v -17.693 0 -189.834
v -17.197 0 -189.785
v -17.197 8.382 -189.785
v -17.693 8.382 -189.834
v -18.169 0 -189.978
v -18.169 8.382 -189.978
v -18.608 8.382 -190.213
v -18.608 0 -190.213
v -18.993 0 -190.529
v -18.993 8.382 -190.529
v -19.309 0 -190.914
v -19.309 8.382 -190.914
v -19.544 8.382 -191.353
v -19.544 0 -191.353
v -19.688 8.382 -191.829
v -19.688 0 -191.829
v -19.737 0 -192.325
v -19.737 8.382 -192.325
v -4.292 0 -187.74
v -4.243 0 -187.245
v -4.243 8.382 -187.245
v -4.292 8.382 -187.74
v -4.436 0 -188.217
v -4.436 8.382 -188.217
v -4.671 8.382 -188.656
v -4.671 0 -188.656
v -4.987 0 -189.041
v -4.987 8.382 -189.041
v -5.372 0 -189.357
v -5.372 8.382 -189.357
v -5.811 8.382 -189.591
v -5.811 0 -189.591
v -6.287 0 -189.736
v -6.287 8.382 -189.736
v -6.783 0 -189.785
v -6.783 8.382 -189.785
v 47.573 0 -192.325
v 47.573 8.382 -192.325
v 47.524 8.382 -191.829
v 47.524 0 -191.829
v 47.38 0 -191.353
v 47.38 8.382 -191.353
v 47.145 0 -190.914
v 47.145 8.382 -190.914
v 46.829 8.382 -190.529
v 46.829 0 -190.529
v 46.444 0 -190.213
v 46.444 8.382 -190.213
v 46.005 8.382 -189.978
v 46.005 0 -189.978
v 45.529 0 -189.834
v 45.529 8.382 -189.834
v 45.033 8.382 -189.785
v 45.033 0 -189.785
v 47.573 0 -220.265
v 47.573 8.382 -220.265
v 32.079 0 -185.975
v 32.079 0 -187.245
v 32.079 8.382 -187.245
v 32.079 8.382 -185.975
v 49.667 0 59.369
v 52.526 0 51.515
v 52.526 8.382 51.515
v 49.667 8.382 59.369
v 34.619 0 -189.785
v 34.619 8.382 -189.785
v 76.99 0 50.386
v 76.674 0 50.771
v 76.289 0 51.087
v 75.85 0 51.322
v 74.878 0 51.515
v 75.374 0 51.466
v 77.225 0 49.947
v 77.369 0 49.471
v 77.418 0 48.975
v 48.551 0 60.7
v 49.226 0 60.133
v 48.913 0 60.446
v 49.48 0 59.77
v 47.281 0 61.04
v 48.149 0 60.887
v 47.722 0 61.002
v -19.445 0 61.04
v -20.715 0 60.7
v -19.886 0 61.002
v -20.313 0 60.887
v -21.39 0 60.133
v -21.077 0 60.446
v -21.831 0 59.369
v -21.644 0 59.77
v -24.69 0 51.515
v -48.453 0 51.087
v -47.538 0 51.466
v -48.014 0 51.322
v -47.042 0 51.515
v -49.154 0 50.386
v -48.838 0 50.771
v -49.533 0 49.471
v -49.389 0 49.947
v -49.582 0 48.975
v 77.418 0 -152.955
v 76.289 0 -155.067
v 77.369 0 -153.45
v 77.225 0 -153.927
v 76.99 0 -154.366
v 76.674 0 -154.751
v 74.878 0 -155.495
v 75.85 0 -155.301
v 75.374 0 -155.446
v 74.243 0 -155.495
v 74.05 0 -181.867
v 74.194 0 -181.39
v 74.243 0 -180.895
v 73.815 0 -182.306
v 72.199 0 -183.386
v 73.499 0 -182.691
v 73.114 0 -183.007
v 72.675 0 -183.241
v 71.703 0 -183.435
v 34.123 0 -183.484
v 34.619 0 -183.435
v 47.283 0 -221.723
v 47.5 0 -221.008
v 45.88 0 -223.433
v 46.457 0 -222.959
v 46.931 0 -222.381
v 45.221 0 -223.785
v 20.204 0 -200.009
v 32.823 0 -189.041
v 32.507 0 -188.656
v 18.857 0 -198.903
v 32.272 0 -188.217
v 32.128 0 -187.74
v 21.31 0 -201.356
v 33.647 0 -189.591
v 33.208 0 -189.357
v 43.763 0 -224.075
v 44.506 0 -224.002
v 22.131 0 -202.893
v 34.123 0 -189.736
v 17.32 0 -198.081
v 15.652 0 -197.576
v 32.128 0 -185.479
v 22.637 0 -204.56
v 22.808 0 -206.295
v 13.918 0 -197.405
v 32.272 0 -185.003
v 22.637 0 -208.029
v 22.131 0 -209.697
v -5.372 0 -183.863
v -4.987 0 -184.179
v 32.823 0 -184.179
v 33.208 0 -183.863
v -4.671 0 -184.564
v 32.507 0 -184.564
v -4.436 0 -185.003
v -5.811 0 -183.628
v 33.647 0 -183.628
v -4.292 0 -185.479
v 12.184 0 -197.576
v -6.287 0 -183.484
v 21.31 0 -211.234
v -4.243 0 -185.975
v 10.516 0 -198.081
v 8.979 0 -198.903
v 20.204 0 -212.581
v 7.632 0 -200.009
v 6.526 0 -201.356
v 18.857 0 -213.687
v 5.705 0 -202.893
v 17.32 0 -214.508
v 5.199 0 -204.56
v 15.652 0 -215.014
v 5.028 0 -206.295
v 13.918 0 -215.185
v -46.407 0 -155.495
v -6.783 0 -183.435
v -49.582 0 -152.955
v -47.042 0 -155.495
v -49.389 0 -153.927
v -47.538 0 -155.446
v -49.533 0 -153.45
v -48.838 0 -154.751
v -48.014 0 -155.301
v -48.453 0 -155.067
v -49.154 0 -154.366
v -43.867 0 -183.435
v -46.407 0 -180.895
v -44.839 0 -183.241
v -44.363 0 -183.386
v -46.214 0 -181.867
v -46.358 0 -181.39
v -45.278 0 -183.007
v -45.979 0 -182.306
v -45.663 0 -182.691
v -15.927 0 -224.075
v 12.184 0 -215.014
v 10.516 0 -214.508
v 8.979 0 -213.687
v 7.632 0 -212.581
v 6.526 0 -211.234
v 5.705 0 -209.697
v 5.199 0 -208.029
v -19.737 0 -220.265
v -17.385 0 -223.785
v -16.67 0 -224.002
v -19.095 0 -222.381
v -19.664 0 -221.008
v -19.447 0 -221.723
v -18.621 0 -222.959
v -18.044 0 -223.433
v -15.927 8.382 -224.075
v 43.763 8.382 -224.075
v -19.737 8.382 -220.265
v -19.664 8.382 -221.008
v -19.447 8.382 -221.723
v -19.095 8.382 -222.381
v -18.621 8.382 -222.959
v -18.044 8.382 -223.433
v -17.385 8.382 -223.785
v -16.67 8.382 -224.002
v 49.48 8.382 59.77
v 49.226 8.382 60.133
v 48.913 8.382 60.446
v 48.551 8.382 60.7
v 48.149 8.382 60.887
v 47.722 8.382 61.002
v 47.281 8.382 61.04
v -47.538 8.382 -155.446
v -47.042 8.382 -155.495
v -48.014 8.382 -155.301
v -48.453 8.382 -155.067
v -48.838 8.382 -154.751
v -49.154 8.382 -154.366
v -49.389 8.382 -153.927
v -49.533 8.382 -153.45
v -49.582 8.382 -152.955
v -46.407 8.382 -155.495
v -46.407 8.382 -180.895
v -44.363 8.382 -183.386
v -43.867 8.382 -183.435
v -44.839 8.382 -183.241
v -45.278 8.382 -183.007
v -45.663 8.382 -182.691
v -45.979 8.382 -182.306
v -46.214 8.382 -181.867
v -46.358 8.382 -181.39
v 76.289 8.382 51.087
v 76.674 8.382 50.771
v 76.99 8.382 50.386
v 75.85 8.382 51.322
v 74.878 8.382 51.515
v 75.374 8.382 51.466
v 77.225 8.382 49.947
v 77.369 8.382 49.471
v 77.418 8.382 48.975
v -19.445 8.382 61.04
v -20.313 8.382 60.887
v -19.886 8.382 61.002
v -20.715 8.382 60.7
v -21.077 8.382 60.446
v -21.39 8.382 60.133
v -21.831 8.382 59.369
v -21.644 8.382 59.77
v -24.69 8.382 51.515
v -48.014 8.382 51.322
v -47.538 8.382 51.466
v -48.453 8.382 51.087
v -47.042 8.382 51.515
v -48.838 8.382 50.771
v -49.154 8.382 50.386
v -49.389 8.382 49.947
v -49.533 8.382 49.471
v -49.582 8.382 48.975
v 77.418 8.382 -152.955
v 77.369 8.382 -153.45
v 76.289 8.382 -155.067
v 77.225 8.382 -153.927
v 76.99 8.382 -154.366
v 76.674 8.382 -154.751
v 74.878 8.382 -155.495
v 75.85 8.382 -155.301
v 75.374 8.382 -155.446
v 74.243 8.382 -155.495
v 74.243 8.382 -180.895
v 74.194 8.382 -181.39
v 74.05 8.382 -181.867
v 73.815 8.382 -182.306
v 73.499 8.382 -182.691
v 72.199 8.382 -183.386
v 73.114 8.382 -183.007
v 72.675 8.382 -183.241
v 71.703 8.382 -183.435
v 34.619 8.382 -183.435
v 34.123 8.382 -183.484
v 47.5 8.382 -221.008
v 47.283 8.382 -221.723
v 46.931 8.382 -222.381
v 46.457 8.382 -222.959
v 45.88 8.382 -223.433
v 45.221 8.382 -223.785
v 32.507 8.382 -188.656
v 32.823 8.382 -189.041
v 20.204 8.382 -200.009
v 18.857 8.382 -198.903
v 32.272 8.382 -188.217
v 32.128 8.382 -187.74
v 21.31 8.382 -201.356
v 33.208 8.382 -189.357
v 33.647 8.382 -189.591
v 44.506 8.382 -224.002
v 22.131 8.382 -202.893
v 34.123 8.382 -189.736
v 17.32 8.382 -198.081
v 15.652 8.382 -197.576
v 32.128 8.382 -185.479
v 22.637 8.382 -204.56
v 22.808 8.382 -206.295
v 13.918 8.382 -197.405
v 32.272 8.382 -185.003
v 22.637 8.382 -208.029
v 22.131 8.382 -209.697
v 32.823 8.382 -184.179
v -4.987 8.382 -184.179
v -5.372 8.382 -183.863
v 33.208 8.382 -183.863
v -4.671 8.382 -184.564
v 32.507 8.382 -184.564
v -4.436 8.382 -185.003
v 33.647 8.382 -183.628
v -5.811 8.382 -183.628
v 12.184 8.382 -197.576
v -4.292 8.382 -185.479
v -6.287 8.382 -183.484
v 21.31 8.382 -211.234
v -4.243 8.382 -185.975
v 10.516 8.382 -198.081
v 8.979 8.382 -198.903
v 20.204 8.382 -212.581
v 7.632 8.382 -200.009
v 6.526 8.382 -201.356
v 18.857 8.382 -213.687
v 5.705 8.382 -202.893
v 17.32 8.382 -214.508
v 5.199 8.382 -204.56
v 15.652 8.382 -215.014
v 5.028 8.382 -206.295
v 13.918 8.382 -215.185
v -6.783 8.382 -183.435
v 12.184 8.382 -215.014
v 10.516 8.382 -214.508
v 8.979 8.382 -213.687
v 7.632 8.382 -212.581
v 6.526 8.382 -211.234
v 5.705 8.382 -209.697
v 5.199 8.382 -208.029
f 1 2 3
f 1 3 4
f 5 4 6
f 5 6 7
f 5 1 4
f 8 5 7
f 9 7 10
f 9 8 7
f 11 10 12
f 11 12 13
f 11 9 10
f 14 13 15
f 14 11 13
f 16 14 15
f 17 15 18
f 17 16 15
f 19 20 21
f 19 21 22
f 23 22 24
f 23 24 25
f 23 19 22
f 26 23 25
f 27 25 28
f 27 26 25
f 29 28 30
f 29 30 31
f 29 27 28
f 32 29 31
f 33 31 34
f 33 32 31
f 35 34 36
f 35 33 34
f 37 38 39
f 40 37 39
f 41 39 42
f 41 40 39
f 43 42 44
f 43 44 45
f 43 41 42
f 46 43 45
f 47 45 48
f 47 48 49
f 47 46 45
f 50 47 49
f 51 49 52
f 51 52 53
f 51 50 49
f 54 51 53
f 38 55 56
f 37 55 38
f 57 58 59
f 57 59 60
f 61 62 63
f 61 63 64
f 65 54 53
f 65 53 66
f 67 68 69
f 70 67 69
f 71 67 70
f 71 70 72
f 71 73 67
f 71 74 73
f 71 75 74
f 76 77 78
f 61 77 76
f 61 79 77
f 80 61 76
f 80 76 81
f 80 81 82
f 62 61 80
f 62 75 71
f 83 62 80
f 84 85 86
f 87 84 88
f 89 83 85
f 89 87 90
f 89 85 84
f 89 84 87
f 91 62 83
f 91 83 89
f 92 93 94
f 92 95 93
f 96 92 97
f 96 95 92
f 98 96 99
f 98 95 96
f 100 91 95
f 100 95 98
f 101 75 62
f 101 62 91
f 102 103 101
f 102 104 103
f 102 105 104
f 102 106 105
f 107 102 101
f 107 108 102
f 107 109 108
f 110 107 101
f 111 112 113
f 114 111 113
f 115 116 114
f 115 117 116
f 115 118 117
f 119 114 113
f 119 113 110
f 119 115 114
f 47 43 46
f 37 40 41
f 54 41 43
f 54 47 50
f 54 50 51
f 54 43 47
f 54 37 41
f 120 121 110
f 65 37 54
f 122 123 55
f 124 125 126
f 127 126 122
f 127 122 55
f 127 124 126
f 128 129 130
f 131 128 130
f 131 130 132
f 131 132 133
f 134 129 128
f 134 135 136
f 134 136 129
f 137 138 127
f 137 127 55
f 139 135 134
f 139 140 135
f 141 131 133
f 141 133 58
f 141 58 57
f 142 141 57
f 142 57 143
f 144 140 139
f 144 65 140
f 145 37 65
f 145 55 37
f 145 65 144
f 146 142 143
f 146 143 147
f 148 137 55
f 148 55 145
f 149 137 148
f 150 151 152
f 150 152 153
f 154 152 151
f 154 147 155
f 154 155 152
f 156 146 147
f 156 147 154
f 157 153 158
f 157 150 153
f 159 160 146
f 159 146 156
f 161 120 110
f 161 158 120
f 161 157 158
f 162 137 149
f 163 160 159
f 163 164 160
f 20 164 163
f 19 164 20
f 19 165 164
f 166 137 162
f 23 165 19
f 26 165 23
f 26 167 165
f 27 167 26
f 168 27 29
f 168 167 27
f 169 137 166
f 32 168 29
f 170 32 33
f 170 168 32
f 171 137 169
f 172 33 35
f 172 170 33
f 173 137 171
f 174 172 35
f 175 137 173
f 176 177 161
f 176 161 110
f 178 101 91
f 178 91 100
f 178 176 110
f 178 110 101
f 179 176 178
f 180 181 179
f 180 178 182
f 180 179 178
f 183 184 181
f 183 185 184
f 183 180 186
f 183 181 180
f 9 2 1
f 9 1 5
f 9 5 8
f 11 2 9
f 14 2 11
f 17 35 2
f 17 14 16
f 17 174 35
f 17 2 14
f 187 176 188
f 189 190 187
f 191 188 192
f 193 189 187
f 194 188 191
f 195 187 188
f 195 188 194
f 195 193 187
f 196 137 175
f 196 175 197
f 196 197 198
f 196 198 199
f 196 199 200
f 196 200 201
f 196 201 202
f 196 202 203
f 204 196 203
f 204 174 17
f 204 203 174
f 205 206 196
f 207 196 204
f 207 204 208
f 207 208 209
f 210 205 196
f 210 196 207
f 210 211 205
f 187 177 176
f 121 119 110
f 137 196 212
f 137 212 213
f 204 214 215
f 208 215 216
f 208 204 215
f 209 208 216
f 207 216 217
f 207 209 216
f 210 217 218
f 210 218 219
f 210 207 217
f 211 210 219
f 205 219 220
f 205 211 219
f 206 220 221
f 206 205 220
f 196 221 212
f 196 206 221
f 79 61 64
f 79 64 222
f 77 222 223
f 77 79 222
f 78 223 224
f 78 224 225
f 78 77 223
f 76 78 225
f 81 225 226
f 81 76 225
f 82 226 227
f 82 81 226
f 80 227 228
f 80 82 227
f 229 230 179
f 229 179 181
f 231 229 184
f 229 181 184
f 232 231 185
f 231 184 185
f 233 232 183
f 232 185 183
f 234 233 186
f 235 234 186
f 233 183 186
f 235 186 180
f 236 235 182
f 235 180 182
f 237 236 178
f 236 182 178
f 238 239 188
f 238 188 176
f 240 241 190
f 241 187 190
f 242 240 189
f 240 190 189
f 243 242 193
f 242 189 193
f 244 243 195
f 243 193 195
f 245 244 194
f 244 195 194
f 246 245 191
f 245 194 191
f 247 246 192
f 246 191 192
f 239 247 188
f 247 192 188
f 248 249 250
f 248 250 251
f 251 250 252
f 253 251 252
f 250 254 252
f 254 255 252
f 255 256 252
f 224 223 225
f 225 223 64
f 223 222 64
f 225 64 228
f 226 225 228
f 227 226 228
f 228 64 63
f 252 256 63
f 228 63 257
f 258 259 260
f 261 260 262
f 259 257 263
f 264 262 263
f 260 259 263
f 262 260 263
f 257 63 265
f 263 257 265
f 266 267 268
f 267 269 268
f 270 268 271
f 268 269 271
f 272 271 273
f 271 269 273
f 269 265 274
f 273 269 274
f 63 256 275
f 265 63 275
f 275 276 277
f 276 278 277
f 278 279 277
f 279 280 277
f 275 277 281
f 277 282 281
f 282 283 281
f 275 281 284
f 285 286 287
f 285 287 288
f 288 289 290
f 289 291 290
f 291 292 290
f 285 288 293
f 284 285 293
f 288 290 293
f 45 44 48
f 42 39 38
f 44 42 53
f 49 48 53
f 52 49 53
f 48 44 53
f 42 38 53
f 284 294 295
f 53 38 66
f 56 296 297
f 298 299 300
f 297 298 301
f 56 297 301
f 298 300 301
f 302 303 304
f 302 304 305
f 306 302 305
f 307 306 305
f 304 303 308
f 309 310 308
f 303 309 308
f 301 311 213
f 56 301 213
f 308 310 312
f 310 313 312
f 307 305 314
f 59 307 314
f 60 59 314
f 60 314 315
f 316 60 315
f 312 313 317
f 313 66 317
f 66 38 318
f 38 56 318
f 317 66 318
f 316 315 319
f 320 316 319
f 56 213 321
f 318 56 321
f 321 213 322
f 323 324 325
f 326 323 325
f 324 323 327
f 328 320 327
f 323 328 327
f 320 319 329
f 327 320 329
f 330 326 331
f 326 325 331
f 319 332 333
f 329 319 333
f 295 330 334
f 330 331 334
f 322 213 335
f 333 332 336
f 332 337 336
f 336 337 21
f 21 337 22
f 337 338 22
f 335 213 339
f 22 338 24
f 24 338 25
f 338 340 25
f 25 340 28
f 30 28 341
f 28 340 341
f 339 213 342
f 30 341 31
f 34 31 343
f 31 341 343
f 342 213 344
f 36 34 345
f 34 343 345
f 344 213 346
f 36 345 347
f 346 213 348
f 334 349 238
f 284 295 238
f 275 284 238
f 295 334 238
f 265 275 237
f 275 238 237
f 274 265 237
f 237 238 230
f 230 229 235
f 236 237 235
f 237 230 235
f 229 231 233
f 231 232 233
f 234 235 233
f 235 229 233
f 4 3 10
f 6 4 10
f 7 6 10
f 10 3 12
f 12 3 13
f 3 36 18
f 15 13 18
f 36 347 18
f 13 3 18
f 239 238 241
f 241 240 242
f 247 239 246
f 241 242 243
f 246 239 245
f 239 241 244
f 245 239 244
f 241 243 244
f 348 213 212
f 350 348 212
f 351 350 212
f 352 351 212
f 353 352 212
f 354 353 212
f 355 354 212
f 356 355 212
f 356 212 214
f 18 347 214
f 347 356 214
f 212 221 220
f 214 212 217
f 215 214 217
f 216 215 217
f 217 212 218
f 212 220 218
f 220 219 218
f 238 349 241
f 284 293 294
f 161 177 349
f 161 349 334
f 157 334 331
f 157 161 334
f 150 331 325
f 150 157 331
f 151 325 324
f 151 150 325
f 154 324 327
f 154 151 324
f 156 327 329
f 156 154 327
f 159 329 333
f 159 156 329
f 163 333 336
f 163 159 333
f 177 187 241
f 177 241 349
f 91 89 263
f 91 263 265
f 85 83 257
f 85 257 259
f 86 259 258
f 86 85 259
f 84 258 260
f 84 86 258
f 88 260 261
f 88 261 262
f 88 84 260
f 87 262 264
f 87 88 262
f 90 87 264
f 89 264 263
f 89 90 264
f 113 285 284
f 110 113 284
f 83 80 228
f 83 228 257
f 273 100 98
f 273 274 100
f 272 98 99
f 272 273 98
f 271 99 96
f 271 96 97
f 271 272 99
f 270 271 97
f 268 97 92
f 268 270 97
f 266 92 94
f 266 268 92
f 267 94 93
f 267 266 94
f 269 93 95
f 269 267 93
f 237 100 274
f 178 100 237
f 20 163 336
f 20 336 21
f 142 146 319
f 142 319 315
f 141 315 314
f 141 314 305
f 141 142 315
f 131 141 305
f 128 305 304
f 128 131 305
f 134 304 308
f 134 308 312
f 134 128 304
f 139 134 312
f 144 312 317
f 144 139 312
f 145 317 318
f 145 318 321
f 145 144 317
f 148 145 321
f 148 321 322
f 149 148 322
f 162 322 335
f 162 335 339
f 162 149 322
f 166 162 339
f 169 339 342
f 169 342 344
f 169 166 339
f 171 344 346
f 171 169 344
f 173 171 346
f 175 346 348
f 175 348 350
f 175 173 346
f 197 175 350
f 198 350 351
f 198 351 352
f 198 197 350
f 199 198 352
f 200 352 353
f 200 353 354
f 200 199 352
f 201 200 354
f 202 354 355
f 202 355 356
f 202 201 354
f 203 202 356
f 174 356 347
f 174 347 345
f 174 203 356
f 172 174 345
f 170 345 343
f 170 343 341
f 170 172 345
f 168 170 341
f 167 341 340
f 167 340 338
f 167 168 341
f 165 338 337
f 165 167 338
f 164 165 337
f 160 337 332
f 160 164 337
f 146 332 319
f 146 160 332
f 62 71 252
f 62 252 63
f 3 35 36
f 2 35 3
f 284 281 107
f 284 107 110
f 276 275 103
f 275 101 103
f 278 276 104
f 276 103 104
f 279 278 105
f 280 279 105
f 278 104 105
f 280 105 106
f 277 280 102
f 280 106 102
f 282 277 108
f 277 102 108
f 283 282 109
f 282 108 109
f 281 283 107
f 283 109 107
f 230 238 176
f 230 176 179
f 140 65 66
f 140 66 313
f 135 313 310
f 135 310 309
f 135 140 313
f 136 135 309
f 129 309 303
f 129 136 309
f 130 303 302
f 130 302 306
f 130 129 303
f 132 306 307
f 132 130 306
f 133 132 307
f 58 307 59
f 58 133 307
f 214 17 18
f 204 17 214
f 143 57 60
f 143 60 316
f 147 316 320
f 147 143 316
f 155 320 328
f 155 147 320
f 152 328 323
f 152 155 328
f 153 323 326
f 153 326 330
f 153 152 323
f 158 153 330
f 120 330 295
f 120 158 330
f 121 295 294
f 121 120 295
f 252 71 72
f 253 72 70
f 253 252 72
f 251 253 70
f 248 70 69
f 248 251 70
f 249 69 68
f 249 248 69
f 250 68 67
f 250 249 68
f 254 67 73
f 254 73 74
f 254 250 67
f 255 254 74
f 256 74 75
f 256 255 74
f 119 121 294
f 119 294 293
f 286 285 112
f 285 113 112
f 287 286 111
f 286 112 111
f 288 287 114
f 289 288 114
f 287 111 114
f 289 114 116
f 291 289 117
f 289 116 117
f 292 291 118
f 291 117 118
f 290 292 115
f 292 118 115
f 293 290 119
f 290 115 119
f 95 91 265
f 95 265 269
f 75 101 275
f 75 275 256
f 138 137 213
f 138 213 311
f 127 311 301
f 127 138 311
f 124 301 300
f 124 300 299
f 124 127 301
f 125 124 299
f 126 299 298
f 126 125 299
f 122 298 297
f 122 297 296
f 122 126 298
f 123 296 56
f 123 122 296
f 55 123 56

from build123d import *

# Parameters (mm, degrees)
SKETCH1_R           = 8.89
BOSS_EXTRUDE1_DEPTH = 8.382
SKETCH15_W          = 3.175
SKETCH15_H          = 27.94
CUT_EXTRUDE14_DEPTH = 238.219932461
FILLET4_R           = 2.54


with BuildPart() as part:
    # Sketch1 → Boss-Extrude1 (new body)
    with BuildSketch(Plane(origin=(0, 0, 0), x_dir=(1, 0, 0), z_dir=(0, 1, 0))):
        with BuildLine():
            Line((-15.926997076, 224.074744797), (43.763002924, 224.074744797))
            ThreePointArc((43.763002924, 224.074744797), (46.457079761, 222.958821634), (47.573002924, 220.264744797))
            Line((47.573002924, 220.264744797), (47.573002924, 192.324744797))
            ThreePointArc((47.573002924, 192.324744797), (46.829054148, 190.528693573), (45.033002924, 189.784744797))
            Line((45.033002924, 189.784744797), (34.619002924, 189.784744797))
            ThreePointArc((34.619002924, 189.784744797), (32.8229517, 189.040796021), (32.079002924, 187.244744797))
            Line((32.079002924, 187.244744797), (32.079002924, 185.974744797))
            ThreePointArc((32.079002924, 185.974744797), (32.8229517, 184.178693573), (34.619002924, 183.434744797))
            Line((34.619002924, 183.434744797), (74.878002924, 183.434744797))
            ThreePointArc((74.878002924, 183.434744797), (76.674054148, 182.690796021), (77.418002924, 180.894744797))
            Line((77.418002924, 180.894744797), (77.418002924, -51.515255203))
            Line((77.418002924, -51.515255203), (52.526002924, -51.515255203))
            Line((52.526002924, -51.515255203), (49.667478553, -59.368986367))
            ThreePointArc((49.667478553, -59.368986367), (48.737543444, -60.580901395), (47.280659296, -61.040255203))
            Line((47.280659296, -61.040255203), (-19.444653447, -61.040255203))
            ThreePointArc((-19.444653447, -61.040255203), (-20.901537596, -60.580901395), (-21.831472704, -59.368986367))
            Line((-21.831472704, -59.368986367), (-24.689997076, -51.515255203))
            Line((-24.689997076, -51.515255203), (-49.581997076, -51.515255203))
            Line((-49.581997076, -51.515255203), (-49.581997076, 180.894744797))
            ThreePointArc((-49.581997076, 180.894744797), (-48.8380483, 182.690796021), (-47.041997076, 183.434744797))
            Line((-47.041997076, 183.434744797), (-6.782997076, 183.434744797))
            ThreePointArc((-6.782997076, 183.434744797), (-4.986945852, 184.178693573), (-4.242997076, 185.974744797))
            Line((-4.242997076, 185.974744797), (-4.242997076, 187.244744797))
            ThreePointArc((-4.242997076, 187.244744797), (-4.986945852, 189.040796021), (-6.782997076, 189.784744797))
            Line((-6.782997076, 189.784744797), (-17.196997076, 189.784744797))
            ThreePointArc((-17.196997076, 189.784744797), (-18.9930483, 190.528693573), (-19.736997076, 192.324744797))
            Line((-19.736997076, 192.324744797), (-19.736997076, 220.264744797))
            ThreePointArc((-19.736997076, 220.264744797), (-18.621073912, 222.958821634), (-15.926997076, 224.074744797))
        make_face()
        with Locations(Location((13.918002924, 206.294744797, 0), (0, 0, 270))):
            Circle(SKETCH1_R, mode=Mode.SUBTRACT)
    extrude(amount=BOSS_EXTRUDE1_DEPTH)

    # Sketch15 → Cut-Extrude14 (cut, through all)
    with BuildSketch(Plane(origin=(0, 8.382, 0), x_dir=(-1, 0, 0), z_dir=(0, 1, 0))):
        with Locations((47.994497076, -169.464744797)):
            Rectangle(SKETCH15_W, SKETCH15_H)
        with Locations((-75.830502924, -169.464744797)):
            Rectangle(SKETCH15_W, SKETCH15_H)
    extrude(amount=-CUT_EXTRUDE14_DEPTH, mode=Mode.SUBTRACT)

    # Fillet4
    fillet4_edges = [part.edges().sort_by_distance(p)[0] for p in [
        (74.243002924, 4.191, -183.434744797),
        (77.418002924, 4.191, -155.494744797),
        (-49.581997076, 4.191, 51.515255203),
        (77.418002924, 4.191, 51.515255203),
        (-49.581997076, 4.191, -155.494744797),
        (-46.406997076, 4.191, -183.434744797),
    ]]
    fillet(fillet4_edges, radius=FILLET4_R)


solid = part.part
